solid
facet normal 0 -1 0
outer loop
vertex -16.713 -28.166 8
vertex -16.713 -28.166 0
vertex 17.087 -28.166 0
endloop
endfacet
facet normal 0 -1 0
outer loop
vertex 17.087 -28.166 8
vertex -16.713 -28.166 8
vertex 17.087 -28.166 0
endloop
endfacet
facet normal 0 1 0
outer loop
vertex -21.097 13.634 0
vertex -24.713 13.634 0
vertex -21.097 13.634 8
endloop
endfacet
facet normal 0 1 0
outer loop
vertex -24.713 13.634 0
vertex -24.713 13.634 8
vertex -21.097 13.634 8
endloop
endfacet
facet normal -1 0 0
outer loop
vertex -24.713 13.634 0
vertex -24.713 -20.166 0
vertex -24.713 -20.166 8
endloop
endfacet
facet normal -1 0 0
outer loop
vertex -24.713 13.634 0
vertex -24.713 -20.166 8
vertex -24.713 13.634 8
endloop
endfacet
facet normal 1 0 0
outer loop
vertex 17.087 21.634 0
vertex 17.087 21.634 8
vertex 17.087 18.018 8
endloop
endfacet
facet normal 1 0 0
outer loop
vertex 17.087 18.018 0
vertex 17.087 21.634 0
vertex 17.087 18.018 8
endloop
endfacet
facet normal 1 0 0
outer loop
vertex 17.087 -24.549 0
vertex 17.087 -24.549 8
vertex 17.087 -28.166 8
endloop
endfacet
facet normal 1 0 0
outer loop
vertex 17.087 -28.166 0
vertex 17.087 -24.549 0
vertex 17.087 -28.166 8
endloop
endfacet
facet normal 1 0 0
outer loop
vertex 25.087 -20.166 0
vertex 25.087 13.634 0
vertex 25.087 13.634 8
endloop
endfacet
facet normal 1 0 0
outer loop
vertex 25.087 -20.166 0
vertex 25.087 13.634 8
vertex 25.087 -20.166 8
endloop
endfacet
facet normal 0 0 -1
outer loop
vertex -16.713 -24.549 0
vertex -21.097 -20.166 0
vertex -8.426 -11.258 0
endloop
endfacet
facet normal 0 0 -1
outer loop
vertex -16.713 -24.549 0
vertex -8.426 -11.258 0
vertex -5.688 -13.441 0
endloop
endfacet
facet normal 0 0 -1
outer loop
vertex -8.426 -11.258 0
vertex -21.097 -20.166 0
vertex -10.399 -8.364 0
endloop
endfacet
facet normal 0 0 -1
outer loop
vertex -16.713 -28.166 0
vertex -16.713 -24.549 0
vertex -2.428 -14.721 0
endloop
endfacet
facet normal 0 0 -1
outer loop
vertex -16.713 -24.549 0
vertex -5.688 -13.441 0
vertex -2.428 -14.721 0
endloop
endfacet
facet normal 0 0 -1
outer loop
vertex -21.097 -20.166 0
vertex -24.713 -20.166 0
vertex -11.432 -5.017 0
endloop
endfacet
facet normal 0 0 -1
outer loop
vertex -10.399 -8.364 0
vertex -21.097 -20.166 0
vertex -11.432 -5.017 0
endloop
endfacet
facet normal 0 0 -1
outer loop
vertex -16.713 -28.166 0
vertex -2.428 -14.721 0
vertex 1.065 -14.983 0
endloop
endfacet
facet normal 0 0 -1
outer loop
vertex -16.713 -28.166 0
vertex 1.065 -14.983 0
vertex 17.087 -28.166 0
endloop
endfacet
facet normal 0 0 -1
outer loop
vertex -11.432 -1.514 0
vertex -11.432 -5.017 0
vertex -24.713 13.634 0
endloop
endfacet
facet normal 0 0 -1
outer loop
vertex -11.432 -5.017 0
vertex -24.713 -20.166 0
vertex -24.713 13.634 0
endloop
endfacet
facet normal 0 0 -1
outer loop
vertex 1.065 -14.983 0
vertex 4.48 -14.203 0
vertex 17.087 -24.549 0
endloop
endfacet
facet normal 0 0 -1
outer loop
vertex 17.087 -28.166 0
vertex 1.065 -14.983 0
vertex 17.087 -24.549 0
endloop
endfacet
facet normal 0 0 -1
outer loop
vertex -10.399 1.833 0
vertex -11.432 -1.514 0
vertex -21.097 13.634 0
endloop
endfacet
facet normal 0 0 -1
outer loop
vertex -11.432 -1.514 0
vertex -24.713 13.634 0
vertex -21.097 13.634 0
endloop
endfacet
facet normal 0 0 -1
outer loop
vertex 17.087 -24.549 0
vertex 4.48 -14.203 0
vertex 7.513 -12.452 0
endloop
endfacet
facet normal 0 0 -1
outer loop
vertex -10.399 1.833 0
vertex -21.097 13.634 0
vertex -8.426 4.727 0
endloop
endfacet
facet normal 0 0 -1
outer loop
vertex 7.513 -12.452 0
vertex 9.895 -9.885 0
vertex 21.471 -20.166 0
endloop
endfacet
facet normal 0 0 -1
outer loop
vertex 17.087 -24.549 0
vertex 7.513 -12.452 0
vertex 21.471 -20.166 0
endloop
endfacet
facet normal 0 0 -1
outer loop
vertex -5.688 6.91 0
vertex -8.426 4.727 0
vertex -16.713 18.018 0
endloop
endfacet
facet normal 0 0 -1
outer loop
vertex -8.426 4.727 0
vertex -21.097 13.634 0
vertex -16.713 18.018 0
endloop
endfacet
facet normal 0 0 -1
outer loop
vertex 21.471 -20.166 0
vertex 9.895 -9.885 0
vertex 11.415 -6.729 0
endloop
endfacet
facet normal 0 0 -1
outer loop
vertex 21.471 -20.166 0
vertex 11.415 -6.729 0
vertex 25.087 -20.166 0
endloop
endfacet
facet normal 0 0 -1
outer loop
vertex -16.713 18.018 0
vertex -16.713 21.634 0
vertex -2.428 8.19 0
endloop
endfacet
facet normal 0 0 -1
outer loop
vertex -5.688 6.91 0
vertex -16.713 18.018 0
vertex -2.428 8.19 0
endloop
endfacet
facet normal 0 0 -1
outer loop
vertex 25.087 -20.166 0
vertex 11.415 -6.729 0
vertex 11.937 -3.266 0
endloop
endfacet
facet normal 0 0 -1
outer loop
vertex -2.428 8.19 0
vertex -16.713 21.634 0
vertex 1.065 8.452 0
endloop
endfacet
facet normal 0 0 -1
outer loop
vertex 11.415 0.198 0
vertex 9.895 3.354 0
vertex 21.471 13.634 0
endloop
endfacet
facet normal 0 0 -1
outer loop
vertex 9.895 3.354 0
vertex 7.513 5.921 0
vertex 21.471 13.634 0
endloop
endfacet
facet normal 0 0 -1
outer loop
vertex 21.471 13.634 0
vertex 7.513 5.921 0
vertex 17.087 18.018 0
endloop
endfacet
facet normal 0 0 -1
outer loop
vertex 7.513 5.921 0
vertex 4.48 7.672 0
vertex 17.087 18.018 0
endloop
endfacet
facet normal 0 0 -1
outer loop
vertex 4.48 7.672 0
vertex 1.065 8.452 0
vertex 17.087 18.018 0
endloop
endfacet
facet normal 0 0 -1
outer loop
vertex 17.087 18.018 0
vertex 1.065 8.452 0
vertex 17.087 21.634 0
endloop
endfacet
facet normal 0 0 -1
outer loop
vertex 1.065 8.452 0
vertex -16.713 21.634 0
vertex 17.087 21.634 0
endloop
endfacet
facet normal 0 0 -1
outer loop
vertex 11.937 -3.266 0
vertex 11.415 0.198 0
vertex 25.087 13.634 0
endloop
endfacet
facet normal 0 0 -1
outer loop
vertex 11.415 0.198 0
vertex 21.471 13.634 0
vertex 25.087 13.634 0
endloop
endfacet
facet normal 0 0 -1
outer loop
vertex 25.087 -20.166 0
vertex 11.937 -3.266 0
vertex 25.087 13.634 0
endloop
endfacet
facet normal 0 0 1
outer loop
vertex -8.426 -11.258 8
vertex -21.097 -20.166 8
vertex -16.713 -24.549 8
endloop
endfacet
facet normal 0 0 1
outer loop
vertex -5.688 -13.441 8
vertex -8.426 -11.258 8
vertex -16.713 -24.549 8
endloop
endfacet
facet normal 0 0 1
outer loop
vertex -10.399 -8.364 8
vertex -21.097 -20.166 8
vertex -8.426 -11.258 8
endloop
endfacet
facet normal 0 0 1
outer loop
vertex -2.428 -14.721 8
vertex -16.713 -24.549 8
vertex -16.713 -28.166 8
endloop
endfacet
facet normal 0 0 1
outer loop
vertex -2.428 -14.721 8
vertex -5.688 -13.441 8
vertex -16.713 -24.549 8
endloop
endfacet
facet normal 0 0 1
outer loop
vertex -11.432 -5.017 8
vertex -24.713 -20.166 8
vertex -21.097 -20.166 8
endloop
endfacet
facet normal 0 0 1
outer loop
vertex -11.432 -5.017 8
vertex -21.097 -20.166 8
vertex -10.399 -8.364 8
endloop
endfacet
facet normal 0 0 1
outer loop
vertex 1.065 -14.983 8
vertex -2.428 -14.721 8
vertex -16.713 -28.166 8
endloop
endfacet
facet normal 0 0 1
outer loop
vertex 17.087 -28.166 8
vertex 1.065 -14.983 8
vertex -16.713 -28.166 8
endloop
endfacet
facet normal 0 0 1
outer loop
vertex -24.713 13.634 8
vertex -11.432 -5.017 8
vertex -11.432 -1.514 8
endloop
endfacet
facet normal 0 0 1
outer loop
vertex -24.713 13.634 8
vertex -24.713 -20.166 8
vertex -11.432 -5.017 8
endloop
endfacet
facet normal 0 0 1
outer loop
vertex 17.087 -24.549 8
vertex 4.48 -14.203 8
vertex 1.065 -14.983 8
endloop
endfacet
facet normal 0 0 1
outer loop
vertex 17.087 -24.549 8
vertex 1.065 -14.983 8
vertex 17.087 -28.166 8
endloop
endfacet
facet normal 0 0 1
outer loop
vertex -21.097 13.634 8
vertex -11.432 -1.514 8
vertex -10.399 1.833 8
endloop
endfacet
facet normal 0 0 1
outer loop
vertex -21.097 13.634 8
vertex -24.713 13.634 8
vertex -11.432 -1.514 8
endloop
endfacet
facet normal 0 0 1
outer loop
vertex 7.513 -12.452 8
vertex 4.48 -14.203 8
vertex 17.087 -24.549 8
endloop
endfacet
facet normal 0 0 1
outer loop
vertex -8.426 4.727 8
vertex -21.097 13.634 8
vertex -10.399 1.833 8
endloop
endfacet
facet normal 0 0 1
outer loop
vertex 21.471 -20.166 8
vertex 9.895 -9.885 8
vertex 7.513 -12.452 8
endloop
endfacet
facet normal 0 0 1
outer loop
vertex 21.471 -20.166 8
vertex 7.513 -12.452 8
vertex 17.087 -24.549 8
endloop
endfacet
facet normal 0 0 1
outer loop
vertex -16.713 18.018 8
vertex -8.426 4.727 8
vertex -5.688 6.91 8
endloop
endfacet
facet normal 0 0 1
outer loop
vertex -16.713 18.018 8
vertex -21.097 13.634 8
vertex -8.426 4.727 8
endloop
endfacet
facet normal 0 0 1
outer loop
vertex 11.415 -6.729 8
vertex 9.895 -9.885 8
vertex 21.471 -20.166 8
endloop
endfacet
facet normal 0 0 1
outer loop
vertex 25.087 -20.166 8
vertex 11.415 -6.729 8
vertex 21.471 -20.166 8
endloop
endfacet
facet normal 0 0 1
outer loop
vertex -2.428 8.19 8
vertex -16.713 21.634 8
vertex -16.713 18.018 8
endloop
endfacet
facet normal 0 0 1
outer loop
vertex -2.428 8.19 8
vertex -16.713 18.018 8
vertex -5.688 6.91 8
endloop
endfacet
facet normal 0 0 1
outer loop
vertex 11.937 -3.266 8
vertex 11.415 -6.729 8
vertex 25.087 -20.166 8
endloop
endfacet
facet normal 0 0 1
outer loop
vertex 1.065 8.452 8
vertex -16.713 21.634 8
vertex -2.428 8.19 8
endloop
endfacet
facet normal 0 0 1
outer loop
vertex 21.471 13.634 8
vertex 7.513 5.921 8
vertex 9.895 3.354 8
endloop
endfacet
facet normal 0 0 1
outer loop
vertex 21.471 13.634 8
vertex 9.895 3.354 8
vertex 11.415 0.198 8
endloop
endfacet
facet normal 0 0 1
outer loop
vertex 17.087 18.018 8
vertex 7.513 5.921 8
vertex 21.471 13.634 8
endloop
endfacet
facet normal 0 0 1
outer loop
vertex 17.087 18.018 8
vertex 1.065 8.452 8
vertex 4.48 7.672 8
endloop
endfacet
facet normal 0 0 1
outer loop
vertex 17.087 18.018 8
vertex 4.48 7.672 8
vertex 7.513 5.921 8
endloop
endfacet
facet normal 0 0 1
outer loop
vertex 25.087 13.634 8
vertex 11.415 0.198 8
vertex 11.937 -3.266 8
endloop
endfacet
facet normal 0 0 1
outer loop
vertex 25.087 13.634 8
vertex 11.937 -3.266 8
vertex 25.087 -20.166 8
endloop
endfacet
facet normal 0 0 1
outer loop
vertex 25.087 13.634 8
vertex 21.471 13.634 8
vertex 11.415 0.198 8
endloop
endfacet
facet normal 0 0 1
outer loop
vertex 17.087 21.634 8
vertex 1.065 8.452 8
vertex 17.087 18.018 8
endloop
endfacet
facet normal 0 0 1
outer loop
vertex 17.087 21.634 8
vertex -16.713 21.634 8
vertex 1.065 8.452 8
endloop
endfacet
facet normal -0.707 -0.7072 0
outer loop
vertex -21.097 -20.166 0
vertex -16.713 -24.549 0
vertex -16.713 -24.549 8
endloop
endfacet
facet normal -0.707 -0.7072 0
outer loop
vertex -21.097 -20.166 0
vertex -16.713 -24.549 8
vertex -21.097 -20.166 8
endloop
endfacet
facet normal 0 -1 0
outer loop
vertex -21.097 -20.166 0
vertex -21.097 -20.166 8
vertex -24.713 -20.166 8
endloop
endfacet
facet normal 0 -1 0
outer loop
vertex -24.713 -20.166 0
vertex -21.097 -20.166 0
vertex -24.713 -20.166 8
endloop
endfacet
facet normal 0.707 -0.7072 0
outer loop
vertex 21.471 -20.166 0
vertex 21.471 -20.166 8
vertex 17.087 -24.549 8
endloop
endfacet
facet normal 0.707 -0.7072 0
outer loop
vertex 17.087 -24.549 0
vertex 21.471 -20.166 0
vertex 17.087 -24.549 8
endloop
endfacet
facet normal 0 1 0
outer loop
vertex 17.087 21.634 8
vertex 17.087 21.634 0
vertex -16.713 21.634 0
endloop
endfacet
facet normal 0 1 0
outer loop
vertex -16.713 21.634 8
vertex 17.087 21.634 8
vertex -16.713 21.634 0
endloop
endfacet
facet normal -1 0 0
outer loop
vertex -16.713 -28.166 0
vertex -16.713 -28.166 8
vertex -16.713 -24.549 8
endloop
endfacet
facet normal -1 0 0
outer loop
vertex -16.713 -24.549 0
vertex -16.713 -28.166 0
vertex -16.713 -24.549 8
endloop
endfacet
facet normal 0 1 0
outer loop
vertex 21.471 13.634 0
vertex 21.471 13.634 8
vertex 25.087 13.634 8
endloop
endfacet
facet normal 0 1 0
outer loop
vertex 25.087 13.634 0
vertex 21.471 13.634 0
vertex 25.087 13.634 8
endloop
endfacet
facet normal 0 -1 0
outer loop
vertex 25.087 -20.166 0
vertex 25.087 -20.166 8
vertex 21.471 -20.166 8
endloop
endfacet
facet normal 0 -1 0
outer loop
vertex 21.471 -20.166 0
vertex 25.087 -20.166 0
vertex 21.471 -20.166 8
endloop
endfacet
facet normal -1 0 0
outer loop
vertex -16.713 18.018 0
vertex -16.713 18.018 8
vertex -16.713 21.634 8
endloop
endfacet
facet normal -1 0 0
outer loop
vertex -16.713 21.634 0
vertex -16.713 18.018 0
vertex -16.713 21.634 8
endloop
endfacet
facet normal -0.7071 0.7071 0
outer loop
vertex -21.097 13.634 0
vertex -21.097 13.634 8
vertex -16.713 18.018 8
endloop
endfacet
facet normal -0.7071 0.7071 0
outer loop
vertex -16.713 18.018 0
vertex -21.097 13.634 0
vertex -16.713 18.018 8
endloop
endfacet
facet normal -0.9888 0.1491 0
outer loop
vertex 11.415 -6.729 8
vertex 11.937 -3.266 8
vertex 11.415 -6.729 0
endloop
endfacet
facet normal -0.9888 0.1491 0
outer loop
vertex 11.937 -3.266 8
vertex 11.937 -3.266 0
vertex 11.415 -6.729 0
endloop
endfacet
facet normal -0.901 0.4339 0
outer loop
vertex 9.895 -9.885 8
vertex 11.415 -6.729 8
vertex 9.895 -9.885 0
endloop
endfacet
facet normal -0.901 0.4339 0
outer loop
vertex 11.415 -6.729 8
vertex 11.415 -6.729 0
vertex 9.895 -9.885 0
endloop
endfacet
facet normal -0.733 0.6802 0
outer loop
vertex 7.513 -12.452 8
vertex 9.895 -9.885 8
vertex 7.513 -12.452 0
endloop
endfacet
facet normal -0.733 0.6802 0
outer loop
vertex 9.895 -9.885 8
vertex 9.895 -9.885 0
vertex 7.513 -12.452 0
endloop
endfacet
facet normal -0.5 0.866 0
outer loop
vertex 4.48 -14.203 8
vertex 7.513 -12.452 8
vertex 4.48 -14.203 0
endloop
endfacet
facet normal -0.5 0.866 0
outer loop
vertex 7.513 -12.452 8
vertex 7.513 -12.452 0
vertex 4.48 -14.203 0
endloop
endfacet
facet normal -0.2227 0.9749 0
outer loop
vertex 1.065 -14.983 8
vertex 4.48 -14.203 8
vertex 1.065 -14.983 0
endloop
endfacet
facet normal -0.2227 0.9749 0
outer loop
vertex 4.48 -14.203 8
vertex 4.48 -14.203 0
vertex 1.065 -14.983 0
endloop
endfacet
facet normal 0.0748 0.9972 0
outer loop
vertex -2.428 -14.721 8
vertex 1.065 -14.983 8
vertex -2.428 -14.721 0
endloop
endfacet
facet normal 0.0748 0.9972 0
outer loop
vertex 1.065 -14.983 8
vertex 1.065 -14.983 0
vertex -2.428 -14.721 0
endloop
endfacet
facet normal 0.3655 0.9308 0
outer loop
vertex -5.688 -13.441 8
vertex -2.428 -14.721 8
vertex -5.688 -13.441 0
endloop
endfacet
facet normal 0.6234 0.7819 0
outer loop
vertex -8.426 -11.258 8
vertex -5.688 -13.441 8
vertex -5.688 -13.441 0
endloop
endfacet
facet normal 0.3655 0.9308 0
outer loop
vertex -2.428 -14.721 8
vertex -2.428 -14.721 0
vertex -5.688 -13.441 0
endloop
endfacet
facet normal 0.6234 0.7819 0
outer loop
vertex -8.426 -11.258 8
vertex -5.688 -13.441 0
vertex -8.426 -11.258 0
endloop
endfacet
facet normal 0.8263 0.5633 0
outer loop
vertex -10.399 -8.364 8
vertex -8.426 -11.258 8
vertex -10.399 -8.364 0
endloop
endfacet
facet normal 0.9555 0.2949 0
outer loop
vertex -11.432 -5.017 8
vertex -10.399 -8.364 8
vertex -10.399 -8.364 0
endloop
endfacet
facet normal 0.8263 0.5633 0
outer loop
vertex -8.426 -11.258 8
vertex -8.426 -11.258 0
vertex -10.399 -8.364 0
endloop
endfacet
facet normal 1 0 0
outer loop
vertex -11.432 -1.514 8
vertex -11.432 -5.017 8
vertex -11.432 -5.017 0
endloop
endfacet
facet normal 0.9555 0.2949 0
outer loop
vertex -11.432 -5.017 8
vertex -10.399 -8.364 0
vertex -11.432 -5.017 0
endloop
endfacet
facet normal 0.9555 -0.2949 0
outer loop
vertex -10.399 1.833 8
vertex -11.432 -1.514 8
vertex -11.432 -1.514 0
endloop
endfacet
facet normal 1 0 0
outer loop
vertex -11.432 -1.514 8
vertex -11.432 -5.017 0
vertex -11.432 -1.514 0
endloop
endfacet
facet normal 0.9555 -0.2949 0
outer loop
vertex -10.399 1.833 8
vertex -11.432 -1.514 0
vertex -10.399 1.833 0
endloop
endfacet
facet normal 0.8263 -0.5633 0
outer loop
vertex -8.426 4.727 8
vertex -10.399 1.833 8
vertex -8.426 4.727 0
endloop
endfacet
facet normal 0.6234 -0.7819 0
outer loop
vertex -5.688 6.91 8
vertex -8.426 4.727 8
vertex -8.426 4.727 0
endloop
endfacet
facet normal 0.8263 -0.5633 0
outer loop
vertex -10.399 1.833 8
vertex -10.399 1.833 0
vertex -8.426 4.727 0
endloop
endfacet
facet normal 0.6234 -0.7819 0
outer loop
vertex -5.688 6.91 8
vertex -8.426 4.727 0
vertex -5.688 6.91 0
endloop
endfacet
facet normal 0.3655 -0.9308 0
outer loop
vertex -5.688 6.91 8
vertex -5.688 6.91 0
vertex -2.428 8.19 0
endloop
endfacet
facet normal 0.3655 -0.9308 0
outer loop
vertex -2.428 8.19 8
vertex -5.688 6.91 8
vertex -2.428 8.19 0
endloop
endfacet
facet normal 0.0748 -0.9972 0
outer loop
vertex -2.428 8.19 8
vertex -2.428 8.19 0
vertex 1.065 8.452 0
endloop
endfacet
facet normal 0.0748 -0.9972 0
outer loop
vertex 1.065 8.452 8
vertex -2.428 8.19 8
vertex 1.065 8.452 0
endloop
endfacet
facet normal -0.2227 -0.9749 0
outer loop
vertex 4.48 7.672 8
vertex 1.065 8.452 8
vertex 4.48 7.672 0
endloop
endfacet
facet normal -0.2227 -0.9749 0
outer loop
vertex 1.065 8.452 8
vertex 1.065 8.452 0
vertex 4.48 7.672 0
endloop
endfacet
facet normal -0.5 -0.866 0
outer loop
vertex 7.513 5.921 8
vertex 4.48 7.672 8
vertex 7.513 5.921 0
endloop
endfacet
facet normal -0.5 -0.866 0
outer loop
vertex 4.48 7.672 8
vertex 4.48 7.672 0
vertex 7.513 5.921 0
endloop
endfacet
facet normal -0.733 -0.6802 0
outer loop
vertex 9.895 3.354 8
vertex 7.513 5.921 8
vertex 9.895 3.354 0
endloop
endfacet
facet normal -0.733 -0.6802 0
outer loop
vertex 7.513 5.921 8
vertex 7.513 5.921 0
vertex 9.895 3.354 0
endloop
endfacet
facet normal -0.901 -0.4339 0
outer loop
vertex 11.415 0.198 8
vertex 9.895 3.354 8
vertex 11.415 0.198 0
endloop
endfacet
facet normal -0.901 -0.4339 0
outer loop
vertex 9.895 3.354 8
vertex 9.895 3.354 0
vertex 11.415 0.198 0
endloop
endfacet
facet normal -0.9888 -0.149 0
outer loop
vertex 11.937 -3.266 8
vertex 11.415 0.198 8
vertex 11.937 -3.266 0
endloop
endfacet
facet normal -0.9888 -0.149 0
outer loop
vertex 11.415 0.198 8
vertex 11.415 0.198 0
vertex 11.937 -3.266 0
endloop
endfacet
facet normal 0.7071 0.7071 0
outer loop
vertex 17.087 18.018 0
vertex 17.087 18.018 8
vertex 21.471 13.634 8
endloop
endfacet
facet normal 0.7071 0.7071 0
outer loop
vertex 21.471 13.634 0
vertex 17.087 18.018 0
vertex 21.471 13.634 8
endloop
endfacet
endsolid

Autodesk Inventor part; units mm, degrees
ref_plane "YZ Plane" through (0, 0, 0) normal (1, 0, 0) x (0, 1, 0)
ref_plane "XZ Plane" through (0, 0, 0) normal (0, 1, 0) x (-1, 0, 0)
ref_plane "XY Plane" through (0, 0, 0) normal (0, 0, 1) x (1, 0, 0)
sketch "Sketch1" plane through (0, 0, 0) normal (0, 0, 1) x (1, 0, 0)
  line L0 (21.5871, 13.6345) -> (17.0871, 18.1345) projected
  line L1 (17.0871, 18.1345) -> (-16.7129, 18.1345) projected
  line L2 (-16.7129, 18.1345) -> (-21.2129, 13.6345) projected
  line L3 (-21.0966, 13.6345) -> (-21.0966, -20.1655) projected
  line L4 (21.4709, -20.1655) -> (21.4709, 13.6345) projected
  line L5 (21.4709, -20.1655) -> (17.0871, -24.4078) projected
  line L6 (-16.7129, -24.4078) -> (17.0871, -24.4078) projected
  line L7 (-16.7129, -24.4078) -> (-21.0966, -20.1655) projected
  line L8 (-24.7129, -28.1655) -> (-24.7129, 13.6345) construction
  line L9 (25.0871, -28.1655) -> (-24.7129, -28.1655) construction
  line L10 (25.0871, -28.1655) -> (25.0871, 13.6345) construction
  line L11 (17.0871, 21.6345) -> (-16.7129, 21.6345) construction
  line L12 (0.1871, -36.5255) -> (0.1871, 21.9945)
  line L13 (14.6206, -3.2655) -> (-14.2825, -3.2655) construction
  line L14 (-21.0552, -20.0655) -> (-16.6129, -24.5078)
  line L15 (-16.6129, -24.5078) -> (-16.6129, -28.1655)
  line L16 (-16.6129, -28.1655) -> (16.9871, -28.1655)
  line L17 (16.9871, -28.1655) -> (16.9871, -24.5078)
  line L18 (16.9871, -24.5078) -> (21.4295, -20.0655)
  line L19 (25.0871, -20.0655) -> (21.4295, -20.0655)
  line L20 (25.0871, 13.5345) -> (25.0871, -20.0655)
  line L21 (21.4295, 13.5345) -> (25.0871, 13.5345)
  line L22 (21.4295, 13.5345) -> (16.9871, 17.9768)
  line L23 (16.9871, 17.9768) -> (16.9871, 21.6345)
  line L24 (16.9871, 21.6345) -> (-16.6129, 21.6345)
  line L25 (-16.6129, 21.6345) -> (-16.6129, 17.9768)
  line L26 (-16.6129, 17.9768) -> (-21.0552, 13.5345)
  line L27 (-24.7129, 13.5345) -> (-21.0552, 13.5345)
  line L28 (-24.7129, -20.0655) -> (-24.7129, 13.5345)
  line L29 (-21.0552, -20.0655) -> (-24.7129, -20.0655)
  circle A0 centre (0.1871, -3.2655) radius 11.75
  point P0 (14.2, -44.8454)
  point P1 (11.9334, -2.9712)
  point P2 (-1.4501, -14.9009)
  point P3 (-5.6, -13.4915)
  point P4 (-9.0465, 4.0011)
  point P5 (-6.23, 6.5774)
  point P6 (11.3484, 0.4071)
  point P7 (16.9871, 19.8057)
  dimension "d48" = 23.5
extrude "Extrusion1" add sketch "Sketch1" along normal blind 8 contours L23 L22 L21 L4 L19 L18 L6 L12 A0 L1 | L1 L12 L24 L23 | L12 A0 L6 L14 L29 L3 L27 L26 L25 L1 | L1 L25 L24 L12 | L21 L20 L19 L4 | L12 L16 L15 L14 L6 | L6 L18 L17 L16 L12 | L3 L29 L28 L27
sketch "Skizze3" plane through (0, 0, 8) normal (0, 0, 1) x (1, 0, 0)
  circle A0 centre (0.1871, -3.2655) radius 11.75 construction
  line L0 (-21.0552, -20.0655) -> (-16.6129, -24.5078) projected
  line L1 (-16.6129, -24.5078) -> (-16.6129, -28.1655) projected
  line L2 (-16.6129, -28.1655) -> (16.9871, -28.1655) construction
  line L3 (16.9871, -28.1655) -> (16.9871, -24.5078) projected
  line L4 (16.9871, -24.5078) -> (21.4295, -20.0655) projected
  line L5 (21.4295, -20.0655) -> (25.0871, -20.0655) projected
  line L6 (25.0871, -20.0655) -> (25.0871, 13.5345) construction
  line L7 (25.0871, 13.5345) -> (21.4295, 13.5345) projected
  line L8 (21.4295, 13.5345) -> (16.9871, 17.9768) projected
  line L9 (16.9871, 17.9768) -> (16.9871, 21.6345) projected
  line L10 (16.9871, 21.6345) -> (-16.6129, 21.6345) construction
  line L11 (-16.6129, 21.6345) -> (-16.6129, 17.9768) projected
  line L12 (-16.6129, 17.9768) -> (-21.0552, 13.5345) projected
  line L13 (-21.0552, 13.5345) -> (-24.7129, 13.5345) projected
  line L14 (-24.7129, 13.5345) -> (-24.7129, -20.0655) construction
  line L15 (-24.7129, -20.0655) -> (-21.0552, -20.0655) projected
  line L16 (-16.7129, 21.7345) -> (17.0871, 21.7345) construction
  line L17 (17.0871, 21.7345) -> (17.0871, 18.0183)
  line L18 (17.0871, 18.0183) -> (21.4709, 13.6345)
  line L19 (21.4709, 13.6345) -> (25.1871, 13.6345)
  line L20 (25.1871, 13.6345) -> (25.1871, -20.1655) construction
  line L21 (25.1871, -20.1655) -> (21.4709, -20.1655)
  line L22 (21.4709, -20.1655) -> (17.0871, -24.5493)
  line L23 (17.0871, -24.5493) -> (17.0871, -28.2655)
  line L24 (17.0871, -28.2655) -> (-16.7129, -28.2655) construction
  line L25 (-16.7129, -28.2655) -> (-16.7129, -24.5493)
  line L26 (-16.7129, -24.5493) -> (-21.0966, -20.1655)
  line L27 (-21.0966, -20.1655) -> (-24.8129, -20.1655)
  line L28 (-24.8129, -20.1655) -> (-24.8129, 13.6345) construction
  line L29 (-24.8129, 13.6345) -> (-21.0966, 13.6345)
  line L30 (-21.0966, 13.6345) -> (-16.7129, 18.0183)
  line L31 (-16.7129, 18.0183) -> (-16.7129, 21.7345)
  line L32 (-21.0552, 13.5345) -> (-24.7129, 13.5345) projected
  line L33 (-24.7129, 13.5345) -> (-24.7129, 13.6345)
  line L34 (-16.6129, 21.6345) -> (-16.7129, 21.6345)
  line L35 (16.9871, 21.6345) -> (17.0871, 21.6345)
  line L36 (25.0871, 13.5345) -> (25.0871, 13.6345)
  line L37 (25.0871, -20.0655) -> (25.0871, -20.1655)
  line L38 (-16.6129, -28.1655) -> (16.9871, -28.1655) projected
  line L39 (16.9871, -28.1655) -> (17.0871, -28.1655)
  line L40 (-16.6129, -28.1655) -> (-16.7129, -28.1655)
  line L41 (-24.7129, -20.0655) -> (-24.7129, -20.1655)
  point P0 (0, 0)
  dimension "d52" = 0.1
extrude "IM_offset" add sketch "Skizze3" against normal up to surface (8 mm away)
properties part number "20_Cube_Insert_Holder-okular+flashlight_v3"
